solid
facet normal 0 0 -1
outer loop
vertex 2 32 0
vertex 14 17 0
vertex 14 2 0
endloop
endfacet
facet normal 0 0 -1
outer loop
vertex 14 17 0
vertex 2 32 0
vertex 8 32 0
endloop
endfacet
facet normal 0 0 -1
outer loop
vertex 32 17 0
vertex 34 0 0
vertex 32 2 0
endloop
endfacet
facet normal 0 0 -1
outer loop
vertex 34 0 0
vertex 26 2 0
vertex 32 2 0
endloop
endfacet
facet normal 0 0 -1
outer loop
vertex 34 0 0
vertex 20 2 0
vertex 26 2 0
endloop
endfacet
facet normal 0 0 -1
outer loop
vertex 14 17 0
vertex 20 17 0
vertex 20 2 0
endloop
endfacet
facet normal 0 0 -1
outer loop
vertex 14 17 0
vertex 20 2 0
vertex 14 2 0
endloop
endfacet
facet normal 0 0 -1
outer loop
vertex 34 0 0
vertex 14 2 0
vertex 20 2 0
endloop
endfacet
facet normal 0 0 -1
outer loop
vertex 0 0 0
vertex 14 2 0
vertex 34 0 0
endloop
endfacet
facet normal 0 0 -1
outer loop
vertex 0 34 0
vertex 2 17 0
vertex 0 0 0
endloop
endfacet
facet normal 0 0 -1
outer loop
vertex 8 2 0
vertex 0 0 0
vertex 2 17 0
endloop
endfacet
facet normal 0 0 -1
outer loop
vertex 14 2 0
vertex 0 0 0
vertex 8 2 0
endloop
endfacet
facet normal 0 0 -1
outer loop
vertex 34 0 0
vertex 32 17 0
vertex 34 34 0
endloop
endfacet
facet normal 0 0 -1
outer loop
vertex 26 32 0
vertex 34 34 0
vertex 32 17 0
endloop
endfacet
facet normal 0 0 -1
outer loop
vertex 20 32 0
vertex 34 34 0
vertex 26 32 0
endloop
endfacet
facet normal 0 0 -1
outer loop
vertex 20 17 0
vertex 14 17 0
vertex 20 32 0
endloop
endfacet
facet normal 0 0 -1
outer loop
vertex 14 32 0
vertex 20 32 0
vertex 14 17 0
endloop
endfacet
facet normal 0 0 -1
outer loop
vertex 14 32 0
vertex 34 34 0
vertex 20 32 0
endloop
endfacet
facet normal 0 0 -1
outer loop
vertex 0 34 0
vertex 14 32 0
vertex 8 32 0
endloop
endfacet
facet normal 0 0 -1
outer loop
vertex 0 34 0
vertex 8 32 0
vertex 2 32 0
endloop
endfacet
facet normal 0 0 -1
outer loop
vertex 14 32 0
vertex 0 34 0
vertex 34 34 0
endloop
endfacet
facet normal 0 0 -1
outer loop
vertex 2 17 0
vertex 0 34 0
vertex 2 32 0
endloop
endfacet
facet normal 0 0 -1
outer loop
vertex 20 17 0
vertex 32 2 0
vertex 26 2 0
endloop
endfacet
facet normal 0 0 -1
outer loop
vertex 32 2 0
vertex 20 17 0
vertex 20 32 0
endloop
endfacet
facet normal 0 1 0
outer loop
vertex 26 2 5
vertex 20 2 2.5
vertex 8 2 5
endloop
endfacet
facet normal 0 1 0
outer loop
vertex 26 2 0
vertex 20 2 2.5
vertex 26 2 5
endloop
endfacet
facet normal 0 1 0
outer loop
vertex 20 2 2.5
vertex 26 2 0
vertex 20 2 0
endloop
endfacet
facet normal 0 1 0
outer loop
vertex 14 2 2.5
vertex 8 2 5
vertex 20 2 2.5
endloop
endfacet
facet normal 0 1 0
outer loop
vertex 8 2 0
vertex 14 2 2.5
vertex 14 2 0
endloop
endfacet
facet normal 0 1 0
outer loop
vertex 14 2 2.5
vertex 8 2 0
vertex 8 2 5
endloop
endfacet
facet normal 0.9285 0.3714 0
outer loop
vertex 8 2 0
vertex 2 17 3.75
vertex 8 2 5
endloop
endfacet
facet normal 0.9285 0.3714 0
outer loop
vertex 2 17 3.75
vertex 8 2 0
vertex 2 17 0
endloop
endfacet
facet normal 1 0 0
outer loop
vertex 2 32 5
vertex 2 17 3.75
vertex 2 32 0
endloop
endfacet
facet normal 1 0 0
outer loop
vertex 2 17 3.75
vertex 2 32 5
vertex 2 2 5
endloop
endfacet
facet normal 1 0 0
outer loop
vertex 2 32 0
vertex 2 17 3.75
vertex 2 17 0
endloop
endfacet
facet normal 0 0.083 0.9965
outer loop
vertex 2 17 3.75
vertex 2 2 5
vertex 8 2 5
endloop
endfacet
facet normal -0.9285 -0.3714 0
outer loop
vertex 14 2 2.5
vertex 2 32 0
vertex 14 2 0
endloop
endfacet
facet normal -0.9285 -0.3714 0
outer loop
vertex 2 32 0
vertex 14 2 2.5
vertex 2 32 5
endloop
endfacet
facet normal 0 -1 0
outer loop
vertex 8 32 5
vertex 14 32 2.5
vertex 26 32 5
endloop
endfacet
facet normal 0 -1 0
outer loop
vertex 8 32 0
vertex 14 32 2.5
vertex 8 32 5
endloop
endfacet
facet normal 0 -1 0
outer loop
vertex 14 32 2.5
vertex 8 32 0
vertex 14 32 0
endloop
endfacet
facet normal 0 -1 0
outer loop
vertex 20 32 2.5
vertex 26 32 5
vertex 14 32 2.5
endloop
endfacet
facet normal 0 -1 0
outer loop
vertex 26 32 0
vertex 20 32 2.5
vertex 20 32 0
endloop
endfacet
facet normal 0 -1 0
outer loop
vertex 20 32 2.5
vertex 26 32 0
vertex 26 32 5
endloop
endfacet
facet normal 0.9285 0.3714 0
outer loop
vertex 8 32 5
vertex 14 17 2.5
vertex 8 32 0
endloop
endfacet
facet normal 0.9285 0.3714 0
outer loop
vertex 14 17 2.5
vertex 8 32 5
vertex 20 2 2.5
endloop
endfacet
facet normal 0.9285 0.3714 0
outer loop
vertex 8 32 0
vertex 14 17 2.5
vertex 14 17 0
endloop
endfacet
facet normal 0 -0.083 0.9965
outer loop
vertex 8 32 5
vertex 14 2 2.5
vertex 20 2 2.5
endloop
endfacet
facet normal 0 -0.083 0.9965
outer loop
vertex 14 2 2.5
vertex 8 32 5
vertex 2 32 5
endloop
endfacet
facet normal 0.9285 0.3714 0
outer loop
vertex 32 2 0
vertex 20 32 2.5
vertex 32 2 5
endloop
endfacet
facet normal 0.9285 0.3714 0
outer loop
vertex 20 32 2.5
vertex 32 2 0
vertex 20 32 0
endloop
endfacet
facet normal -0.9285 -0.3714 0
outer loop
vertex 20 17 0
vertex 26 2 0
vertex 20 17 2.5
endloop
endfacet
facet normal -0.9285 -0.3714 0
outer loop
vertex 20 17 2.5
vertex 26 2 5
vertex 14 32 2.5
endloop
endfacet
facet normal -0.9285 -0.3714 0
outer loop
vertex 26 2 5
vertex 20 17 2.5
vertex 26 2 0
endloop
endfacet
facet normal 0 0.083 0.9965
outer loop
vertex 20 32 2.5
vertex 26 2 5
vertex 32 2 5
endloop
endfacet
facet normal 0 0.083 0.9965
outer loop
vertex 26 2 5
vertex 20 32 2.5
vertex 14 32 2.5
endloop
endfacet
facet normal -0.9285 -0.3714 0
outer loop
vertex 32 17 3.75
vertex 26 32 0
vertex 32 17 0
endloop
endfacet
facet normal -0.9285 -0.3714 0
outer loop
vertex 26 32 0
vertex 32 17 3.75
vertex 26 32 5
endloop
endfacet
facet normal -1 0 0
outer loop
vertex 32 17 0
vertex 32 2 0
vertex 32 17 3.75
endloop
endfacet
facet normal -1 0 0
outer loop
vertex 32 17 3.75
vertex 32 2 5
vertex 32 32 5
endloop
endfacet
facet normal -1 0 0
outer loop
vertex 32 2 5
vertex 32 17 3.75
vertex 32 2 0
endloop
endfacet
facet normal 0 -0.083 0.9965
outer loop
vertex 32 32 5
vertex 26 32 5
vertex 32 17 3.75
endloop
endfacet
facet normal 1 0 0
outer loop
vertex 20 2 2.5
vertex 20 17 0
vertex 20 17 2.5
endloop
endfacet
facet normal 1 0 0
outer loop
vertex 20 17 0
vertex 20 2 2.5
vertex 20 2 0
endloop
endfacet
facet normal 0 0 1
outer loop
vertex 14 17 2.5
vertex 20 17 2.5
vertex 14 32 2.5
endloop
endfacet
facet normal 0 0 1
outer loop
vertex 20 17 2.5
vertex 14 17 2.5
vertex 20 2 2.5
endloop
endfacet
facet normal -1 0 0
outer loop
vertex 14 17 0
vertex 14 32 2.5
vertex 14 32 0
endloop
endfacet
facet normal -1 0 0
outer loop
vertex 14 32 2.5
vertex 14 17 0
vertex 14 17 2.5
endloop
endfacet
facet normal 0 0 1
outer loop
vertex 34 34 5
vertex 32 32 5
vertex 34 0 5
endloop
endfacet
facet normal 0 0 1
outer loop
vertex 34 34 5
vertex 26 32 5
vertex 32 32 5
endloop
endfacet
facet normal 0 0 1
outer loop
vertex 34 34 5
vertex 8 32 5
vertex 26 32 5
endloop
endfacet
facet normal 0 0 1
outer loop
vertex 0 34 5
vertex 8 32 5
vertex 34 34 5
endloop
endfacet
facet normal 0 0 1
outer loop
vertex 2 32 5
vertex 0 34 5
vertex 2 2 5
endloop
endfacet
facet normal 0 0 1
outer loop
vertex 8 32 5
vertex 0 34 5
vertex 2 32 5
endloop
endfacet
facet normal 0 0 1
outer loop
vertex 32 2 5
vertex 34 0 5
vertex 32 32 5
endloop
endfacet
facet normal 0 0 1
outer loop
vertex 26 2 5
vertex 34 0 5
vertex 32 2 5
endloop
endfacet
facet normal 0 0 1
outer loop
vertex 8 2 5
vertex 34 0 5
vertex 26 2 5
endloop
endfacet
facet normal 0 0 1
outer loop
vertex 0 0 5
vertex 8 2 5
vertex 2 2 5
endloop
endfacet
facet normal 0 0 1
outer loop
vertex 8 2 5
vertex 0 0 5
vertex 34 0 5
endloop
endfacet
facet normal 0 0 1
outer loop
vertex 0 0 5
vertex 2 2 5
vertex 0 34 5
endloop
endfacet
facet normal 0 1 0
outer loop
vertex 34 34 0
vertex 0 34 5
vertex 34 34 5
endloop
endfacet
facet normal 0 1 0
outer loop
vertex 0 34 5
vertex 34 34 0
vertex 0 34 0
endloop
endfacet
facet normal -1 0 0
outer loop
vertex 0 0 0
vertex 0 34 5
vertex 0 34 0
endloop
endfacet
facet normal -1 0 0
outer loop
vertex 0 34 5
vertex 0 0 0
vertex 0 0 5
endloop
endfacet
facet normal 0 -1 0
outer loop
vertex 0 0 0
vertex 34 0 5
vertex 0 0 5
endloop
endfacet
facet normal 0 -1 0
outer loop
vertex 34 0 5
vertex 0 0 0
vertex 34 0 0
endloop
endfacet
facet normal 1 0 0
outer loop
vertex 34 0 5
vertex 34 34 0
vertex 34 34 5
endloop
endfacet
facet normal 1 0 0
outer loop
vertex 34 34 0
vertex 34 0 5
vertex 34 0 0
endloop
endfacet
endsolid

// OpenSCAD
translate([0, 0, 0]);
$fn=20;

d1 = 2;
w = 30;
h = 5;

ww = w / 5;

module mask1(x, y) {
    translate([x+y, 0, 0]) rotate([0, 270, 0]) linear_extrude(y) polygon([[0, 0], [h, 0], [h/2, w], [0, w]]);
}

module mask2(x, y) {
    translate([x, w, 0]) rotate([180, 270, 0]) linear_extrude(y) polygon([[0, 0], [h, 0], [h/2, w], [0, w]]);
}

module logo1() {
    translate([d1, d1, 0]) {
        intersection() {
            linear_extrude(h) polygon([[0, 0], [ww, 0], [0, w/2]]);
            mask1(0, ww);
        }

        intersection() {
            linear_extrude(h) polygon([[ww*2, 0], [ww*3, 0], [ww, w], [0, w]]);
            mask2(0, ww*3);
        }
        linear_extrude(h/2) polygon([[ww*2, 0], [ww*3, 0], [ww*3, w], [ww*2, w]]);
        intersection() {
            linear_extrude(h) polygon([[ww*4, 0], [w, 0], [ww*3, w], [ww*2, w]]);
            mask1(ww*2, ww*3);
        }

        intersection() {
            linear_extrude(h) polygon([[ww*4, w], [w, w], [w, w/2]]);
            mask2(ww*4, ww);
        }

    }
}

logo1();

w0 = w+d1*2;
w1 = w+d1;

translate([0, 0, 0]) {
    linear_extrude(h) {
        polygon(points=[[0, 0], [w0, 0], [w0, w0], [0, w0], [d1, d1], [w1, d1], [w1, w1], [d1, w1]], paths=[[0, 1, 2, 3], [4, 5, 6, 7]]);
    }
}
